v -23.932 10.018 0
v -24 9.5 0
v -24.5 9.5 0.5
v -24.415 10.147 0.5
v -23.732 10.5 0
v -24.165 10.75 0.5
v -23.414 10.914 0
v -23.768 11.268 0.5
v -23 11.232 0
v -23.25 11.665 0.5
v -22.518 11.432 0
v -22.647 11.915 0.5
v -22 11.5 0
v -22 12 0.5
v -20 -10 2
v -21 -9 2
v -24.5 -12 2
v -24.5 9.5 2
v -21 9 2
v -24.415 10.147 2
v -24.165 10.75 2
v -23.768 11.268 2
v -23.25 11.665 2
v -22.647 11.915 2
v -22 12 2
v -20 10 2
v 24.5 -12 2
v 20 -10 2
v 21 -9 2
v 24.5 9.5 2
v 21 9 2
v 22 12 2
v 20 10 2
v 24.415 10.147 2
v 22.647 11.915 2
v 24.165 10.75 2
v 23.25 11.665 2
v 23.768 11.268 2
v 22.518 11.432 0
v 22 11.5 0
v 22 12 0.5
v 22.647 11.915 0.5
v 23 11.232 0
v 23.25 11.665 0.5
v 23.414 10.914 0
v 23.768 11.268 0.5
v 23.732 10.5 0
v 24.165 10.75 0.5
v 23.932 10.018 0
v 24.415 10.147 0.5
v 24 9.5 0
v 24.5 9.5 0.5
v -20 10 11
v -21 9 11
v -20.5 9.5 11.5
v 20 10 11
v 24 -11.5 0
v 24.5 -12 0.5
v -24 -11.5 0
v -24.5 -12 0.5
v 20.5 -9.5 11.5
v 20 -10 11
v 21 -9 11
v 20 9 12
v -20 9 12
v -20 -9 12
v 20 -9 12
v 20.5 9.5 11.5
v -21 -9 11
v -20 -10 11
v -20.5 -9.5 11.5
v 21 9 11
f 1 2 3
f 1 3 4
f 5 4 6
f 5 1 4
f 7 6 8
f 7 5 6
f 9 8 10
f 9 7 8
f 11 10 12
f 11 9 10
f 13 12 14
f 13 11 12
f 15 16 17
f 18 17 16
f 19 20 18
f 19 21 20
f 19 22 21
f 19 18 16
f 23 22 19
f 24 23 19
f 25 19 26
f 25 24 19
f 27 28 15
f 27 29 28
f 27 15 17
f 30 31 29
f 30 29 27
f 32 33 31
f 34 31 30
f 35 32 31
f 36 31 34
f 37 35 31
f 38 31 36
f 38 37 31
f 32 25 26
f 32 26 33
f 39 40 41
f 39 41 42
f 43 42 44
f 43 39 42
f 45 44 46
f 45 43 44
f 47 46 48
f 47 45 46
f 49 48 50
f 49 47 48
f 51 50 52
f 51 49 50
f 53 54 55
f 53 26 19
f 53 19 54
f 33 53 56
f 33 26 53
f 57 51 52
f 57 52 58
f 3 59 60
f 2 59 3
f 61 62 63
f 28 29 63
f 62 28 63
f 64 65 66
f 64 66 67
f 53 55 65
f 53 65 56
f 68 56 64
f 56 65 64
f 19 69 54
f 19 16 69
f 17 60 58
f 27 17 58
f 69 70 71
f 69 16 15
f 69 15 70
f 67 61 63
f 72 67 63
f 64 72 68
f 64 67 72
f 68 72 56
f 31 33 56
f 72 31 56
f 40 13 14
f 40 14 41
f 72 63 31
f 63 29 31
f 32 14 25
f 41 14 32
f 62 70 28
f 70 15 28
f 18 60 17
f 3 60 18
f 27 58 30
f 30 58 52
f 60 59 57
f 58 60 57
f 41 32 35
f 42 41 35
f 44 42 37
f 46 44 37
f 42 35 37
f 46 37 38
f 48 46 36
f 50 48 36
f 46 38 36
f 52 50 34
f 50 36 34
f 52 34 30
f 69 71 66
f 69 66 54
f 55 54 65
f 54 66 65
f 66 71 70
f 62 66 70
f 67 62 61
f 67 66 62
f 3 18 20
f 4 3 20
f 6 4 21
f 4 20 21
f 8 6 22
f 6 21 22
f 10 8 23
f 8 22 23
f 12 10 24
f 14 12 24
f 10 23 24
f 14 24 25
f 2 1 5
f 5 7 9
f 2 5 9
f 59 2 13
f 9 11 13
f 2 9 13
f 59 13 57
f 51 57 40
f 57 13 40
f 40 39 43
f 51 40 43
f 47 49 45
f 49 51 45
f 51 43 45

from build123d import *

# Parameters (mm, degrees)
SKETCH_W        = 49
SKETCH_H        = 24
PAD_DEPTH       = 2
SKETCH001_W     = 42
SKETCH001_H     = 20
PAD001_DEPTH    = 10
FILLET_R        = 2.5
CHAMFER_SIZE    = 1
CHAMFER001_SIZE = 1
CHAMFER002_SIZE = 0.5


with BuildPart() as part:
    # Sketch → Pad (new body)
    with BuildSketch(Plane.XY):
        Rectangle(SKETCH_W, SKETCH_H)
    extrude(amount=PAD_DEPTH)

    # Sketch001 (on Face6 of Pad) → Pad001 (join)
    with BuildSketch(Plane.XY.offset(2)):
        Rectangle(SKETCH001_W, SKETCH001_H)
    extrude(amount=PAD001_DEPTH)

    # Fillet
    fillet_edges = [part.edges().sort_by_distance(p)[0] for p in [
        (24.5, 12, 1),
        (-24.5, 12, 1),
    ]]
    fillet(fillet_edges, radius=FILLET_R)

    # Chamfer
    chamfer_edges = [part.edges().sort_by_distance(p)[0] for p in [
        (-21, 0, 12),
        (0, -10, 12),
        (21, 0, 12),
        (0, 10, 12),
    ]]
    chamfer(chamfer_edges, length=CHAMFER_SIZE)

    # Chamfer001
    chamfer001_edges = [part.edges().sort_by_distance(p)[0] for p in [
        (-21, -10, 6.5),
        (-21, 10, 6.5),
        (21, -10, 6.5),
        (21, 10, 6.5),
    ]]
    chamfer(chamfer001_edges, length=CHAMFER001_SIZE)

    # Chamfer002
    chamfer002_edges = [part.edges().sort_by_distance(p)[0] for p in [
        (0, 12, 0),
        (24.5, -1.25, 0),
        (23.767767, 11.267767, 0),
        (-23.767767, 11.267767, 0),
        (-24.5, -1.25, 0),
        (0, -12, 0),
    ]]
    chamfer(chamfer002_edges, length=CHAMFER002_SIZE)


solid = part.part
